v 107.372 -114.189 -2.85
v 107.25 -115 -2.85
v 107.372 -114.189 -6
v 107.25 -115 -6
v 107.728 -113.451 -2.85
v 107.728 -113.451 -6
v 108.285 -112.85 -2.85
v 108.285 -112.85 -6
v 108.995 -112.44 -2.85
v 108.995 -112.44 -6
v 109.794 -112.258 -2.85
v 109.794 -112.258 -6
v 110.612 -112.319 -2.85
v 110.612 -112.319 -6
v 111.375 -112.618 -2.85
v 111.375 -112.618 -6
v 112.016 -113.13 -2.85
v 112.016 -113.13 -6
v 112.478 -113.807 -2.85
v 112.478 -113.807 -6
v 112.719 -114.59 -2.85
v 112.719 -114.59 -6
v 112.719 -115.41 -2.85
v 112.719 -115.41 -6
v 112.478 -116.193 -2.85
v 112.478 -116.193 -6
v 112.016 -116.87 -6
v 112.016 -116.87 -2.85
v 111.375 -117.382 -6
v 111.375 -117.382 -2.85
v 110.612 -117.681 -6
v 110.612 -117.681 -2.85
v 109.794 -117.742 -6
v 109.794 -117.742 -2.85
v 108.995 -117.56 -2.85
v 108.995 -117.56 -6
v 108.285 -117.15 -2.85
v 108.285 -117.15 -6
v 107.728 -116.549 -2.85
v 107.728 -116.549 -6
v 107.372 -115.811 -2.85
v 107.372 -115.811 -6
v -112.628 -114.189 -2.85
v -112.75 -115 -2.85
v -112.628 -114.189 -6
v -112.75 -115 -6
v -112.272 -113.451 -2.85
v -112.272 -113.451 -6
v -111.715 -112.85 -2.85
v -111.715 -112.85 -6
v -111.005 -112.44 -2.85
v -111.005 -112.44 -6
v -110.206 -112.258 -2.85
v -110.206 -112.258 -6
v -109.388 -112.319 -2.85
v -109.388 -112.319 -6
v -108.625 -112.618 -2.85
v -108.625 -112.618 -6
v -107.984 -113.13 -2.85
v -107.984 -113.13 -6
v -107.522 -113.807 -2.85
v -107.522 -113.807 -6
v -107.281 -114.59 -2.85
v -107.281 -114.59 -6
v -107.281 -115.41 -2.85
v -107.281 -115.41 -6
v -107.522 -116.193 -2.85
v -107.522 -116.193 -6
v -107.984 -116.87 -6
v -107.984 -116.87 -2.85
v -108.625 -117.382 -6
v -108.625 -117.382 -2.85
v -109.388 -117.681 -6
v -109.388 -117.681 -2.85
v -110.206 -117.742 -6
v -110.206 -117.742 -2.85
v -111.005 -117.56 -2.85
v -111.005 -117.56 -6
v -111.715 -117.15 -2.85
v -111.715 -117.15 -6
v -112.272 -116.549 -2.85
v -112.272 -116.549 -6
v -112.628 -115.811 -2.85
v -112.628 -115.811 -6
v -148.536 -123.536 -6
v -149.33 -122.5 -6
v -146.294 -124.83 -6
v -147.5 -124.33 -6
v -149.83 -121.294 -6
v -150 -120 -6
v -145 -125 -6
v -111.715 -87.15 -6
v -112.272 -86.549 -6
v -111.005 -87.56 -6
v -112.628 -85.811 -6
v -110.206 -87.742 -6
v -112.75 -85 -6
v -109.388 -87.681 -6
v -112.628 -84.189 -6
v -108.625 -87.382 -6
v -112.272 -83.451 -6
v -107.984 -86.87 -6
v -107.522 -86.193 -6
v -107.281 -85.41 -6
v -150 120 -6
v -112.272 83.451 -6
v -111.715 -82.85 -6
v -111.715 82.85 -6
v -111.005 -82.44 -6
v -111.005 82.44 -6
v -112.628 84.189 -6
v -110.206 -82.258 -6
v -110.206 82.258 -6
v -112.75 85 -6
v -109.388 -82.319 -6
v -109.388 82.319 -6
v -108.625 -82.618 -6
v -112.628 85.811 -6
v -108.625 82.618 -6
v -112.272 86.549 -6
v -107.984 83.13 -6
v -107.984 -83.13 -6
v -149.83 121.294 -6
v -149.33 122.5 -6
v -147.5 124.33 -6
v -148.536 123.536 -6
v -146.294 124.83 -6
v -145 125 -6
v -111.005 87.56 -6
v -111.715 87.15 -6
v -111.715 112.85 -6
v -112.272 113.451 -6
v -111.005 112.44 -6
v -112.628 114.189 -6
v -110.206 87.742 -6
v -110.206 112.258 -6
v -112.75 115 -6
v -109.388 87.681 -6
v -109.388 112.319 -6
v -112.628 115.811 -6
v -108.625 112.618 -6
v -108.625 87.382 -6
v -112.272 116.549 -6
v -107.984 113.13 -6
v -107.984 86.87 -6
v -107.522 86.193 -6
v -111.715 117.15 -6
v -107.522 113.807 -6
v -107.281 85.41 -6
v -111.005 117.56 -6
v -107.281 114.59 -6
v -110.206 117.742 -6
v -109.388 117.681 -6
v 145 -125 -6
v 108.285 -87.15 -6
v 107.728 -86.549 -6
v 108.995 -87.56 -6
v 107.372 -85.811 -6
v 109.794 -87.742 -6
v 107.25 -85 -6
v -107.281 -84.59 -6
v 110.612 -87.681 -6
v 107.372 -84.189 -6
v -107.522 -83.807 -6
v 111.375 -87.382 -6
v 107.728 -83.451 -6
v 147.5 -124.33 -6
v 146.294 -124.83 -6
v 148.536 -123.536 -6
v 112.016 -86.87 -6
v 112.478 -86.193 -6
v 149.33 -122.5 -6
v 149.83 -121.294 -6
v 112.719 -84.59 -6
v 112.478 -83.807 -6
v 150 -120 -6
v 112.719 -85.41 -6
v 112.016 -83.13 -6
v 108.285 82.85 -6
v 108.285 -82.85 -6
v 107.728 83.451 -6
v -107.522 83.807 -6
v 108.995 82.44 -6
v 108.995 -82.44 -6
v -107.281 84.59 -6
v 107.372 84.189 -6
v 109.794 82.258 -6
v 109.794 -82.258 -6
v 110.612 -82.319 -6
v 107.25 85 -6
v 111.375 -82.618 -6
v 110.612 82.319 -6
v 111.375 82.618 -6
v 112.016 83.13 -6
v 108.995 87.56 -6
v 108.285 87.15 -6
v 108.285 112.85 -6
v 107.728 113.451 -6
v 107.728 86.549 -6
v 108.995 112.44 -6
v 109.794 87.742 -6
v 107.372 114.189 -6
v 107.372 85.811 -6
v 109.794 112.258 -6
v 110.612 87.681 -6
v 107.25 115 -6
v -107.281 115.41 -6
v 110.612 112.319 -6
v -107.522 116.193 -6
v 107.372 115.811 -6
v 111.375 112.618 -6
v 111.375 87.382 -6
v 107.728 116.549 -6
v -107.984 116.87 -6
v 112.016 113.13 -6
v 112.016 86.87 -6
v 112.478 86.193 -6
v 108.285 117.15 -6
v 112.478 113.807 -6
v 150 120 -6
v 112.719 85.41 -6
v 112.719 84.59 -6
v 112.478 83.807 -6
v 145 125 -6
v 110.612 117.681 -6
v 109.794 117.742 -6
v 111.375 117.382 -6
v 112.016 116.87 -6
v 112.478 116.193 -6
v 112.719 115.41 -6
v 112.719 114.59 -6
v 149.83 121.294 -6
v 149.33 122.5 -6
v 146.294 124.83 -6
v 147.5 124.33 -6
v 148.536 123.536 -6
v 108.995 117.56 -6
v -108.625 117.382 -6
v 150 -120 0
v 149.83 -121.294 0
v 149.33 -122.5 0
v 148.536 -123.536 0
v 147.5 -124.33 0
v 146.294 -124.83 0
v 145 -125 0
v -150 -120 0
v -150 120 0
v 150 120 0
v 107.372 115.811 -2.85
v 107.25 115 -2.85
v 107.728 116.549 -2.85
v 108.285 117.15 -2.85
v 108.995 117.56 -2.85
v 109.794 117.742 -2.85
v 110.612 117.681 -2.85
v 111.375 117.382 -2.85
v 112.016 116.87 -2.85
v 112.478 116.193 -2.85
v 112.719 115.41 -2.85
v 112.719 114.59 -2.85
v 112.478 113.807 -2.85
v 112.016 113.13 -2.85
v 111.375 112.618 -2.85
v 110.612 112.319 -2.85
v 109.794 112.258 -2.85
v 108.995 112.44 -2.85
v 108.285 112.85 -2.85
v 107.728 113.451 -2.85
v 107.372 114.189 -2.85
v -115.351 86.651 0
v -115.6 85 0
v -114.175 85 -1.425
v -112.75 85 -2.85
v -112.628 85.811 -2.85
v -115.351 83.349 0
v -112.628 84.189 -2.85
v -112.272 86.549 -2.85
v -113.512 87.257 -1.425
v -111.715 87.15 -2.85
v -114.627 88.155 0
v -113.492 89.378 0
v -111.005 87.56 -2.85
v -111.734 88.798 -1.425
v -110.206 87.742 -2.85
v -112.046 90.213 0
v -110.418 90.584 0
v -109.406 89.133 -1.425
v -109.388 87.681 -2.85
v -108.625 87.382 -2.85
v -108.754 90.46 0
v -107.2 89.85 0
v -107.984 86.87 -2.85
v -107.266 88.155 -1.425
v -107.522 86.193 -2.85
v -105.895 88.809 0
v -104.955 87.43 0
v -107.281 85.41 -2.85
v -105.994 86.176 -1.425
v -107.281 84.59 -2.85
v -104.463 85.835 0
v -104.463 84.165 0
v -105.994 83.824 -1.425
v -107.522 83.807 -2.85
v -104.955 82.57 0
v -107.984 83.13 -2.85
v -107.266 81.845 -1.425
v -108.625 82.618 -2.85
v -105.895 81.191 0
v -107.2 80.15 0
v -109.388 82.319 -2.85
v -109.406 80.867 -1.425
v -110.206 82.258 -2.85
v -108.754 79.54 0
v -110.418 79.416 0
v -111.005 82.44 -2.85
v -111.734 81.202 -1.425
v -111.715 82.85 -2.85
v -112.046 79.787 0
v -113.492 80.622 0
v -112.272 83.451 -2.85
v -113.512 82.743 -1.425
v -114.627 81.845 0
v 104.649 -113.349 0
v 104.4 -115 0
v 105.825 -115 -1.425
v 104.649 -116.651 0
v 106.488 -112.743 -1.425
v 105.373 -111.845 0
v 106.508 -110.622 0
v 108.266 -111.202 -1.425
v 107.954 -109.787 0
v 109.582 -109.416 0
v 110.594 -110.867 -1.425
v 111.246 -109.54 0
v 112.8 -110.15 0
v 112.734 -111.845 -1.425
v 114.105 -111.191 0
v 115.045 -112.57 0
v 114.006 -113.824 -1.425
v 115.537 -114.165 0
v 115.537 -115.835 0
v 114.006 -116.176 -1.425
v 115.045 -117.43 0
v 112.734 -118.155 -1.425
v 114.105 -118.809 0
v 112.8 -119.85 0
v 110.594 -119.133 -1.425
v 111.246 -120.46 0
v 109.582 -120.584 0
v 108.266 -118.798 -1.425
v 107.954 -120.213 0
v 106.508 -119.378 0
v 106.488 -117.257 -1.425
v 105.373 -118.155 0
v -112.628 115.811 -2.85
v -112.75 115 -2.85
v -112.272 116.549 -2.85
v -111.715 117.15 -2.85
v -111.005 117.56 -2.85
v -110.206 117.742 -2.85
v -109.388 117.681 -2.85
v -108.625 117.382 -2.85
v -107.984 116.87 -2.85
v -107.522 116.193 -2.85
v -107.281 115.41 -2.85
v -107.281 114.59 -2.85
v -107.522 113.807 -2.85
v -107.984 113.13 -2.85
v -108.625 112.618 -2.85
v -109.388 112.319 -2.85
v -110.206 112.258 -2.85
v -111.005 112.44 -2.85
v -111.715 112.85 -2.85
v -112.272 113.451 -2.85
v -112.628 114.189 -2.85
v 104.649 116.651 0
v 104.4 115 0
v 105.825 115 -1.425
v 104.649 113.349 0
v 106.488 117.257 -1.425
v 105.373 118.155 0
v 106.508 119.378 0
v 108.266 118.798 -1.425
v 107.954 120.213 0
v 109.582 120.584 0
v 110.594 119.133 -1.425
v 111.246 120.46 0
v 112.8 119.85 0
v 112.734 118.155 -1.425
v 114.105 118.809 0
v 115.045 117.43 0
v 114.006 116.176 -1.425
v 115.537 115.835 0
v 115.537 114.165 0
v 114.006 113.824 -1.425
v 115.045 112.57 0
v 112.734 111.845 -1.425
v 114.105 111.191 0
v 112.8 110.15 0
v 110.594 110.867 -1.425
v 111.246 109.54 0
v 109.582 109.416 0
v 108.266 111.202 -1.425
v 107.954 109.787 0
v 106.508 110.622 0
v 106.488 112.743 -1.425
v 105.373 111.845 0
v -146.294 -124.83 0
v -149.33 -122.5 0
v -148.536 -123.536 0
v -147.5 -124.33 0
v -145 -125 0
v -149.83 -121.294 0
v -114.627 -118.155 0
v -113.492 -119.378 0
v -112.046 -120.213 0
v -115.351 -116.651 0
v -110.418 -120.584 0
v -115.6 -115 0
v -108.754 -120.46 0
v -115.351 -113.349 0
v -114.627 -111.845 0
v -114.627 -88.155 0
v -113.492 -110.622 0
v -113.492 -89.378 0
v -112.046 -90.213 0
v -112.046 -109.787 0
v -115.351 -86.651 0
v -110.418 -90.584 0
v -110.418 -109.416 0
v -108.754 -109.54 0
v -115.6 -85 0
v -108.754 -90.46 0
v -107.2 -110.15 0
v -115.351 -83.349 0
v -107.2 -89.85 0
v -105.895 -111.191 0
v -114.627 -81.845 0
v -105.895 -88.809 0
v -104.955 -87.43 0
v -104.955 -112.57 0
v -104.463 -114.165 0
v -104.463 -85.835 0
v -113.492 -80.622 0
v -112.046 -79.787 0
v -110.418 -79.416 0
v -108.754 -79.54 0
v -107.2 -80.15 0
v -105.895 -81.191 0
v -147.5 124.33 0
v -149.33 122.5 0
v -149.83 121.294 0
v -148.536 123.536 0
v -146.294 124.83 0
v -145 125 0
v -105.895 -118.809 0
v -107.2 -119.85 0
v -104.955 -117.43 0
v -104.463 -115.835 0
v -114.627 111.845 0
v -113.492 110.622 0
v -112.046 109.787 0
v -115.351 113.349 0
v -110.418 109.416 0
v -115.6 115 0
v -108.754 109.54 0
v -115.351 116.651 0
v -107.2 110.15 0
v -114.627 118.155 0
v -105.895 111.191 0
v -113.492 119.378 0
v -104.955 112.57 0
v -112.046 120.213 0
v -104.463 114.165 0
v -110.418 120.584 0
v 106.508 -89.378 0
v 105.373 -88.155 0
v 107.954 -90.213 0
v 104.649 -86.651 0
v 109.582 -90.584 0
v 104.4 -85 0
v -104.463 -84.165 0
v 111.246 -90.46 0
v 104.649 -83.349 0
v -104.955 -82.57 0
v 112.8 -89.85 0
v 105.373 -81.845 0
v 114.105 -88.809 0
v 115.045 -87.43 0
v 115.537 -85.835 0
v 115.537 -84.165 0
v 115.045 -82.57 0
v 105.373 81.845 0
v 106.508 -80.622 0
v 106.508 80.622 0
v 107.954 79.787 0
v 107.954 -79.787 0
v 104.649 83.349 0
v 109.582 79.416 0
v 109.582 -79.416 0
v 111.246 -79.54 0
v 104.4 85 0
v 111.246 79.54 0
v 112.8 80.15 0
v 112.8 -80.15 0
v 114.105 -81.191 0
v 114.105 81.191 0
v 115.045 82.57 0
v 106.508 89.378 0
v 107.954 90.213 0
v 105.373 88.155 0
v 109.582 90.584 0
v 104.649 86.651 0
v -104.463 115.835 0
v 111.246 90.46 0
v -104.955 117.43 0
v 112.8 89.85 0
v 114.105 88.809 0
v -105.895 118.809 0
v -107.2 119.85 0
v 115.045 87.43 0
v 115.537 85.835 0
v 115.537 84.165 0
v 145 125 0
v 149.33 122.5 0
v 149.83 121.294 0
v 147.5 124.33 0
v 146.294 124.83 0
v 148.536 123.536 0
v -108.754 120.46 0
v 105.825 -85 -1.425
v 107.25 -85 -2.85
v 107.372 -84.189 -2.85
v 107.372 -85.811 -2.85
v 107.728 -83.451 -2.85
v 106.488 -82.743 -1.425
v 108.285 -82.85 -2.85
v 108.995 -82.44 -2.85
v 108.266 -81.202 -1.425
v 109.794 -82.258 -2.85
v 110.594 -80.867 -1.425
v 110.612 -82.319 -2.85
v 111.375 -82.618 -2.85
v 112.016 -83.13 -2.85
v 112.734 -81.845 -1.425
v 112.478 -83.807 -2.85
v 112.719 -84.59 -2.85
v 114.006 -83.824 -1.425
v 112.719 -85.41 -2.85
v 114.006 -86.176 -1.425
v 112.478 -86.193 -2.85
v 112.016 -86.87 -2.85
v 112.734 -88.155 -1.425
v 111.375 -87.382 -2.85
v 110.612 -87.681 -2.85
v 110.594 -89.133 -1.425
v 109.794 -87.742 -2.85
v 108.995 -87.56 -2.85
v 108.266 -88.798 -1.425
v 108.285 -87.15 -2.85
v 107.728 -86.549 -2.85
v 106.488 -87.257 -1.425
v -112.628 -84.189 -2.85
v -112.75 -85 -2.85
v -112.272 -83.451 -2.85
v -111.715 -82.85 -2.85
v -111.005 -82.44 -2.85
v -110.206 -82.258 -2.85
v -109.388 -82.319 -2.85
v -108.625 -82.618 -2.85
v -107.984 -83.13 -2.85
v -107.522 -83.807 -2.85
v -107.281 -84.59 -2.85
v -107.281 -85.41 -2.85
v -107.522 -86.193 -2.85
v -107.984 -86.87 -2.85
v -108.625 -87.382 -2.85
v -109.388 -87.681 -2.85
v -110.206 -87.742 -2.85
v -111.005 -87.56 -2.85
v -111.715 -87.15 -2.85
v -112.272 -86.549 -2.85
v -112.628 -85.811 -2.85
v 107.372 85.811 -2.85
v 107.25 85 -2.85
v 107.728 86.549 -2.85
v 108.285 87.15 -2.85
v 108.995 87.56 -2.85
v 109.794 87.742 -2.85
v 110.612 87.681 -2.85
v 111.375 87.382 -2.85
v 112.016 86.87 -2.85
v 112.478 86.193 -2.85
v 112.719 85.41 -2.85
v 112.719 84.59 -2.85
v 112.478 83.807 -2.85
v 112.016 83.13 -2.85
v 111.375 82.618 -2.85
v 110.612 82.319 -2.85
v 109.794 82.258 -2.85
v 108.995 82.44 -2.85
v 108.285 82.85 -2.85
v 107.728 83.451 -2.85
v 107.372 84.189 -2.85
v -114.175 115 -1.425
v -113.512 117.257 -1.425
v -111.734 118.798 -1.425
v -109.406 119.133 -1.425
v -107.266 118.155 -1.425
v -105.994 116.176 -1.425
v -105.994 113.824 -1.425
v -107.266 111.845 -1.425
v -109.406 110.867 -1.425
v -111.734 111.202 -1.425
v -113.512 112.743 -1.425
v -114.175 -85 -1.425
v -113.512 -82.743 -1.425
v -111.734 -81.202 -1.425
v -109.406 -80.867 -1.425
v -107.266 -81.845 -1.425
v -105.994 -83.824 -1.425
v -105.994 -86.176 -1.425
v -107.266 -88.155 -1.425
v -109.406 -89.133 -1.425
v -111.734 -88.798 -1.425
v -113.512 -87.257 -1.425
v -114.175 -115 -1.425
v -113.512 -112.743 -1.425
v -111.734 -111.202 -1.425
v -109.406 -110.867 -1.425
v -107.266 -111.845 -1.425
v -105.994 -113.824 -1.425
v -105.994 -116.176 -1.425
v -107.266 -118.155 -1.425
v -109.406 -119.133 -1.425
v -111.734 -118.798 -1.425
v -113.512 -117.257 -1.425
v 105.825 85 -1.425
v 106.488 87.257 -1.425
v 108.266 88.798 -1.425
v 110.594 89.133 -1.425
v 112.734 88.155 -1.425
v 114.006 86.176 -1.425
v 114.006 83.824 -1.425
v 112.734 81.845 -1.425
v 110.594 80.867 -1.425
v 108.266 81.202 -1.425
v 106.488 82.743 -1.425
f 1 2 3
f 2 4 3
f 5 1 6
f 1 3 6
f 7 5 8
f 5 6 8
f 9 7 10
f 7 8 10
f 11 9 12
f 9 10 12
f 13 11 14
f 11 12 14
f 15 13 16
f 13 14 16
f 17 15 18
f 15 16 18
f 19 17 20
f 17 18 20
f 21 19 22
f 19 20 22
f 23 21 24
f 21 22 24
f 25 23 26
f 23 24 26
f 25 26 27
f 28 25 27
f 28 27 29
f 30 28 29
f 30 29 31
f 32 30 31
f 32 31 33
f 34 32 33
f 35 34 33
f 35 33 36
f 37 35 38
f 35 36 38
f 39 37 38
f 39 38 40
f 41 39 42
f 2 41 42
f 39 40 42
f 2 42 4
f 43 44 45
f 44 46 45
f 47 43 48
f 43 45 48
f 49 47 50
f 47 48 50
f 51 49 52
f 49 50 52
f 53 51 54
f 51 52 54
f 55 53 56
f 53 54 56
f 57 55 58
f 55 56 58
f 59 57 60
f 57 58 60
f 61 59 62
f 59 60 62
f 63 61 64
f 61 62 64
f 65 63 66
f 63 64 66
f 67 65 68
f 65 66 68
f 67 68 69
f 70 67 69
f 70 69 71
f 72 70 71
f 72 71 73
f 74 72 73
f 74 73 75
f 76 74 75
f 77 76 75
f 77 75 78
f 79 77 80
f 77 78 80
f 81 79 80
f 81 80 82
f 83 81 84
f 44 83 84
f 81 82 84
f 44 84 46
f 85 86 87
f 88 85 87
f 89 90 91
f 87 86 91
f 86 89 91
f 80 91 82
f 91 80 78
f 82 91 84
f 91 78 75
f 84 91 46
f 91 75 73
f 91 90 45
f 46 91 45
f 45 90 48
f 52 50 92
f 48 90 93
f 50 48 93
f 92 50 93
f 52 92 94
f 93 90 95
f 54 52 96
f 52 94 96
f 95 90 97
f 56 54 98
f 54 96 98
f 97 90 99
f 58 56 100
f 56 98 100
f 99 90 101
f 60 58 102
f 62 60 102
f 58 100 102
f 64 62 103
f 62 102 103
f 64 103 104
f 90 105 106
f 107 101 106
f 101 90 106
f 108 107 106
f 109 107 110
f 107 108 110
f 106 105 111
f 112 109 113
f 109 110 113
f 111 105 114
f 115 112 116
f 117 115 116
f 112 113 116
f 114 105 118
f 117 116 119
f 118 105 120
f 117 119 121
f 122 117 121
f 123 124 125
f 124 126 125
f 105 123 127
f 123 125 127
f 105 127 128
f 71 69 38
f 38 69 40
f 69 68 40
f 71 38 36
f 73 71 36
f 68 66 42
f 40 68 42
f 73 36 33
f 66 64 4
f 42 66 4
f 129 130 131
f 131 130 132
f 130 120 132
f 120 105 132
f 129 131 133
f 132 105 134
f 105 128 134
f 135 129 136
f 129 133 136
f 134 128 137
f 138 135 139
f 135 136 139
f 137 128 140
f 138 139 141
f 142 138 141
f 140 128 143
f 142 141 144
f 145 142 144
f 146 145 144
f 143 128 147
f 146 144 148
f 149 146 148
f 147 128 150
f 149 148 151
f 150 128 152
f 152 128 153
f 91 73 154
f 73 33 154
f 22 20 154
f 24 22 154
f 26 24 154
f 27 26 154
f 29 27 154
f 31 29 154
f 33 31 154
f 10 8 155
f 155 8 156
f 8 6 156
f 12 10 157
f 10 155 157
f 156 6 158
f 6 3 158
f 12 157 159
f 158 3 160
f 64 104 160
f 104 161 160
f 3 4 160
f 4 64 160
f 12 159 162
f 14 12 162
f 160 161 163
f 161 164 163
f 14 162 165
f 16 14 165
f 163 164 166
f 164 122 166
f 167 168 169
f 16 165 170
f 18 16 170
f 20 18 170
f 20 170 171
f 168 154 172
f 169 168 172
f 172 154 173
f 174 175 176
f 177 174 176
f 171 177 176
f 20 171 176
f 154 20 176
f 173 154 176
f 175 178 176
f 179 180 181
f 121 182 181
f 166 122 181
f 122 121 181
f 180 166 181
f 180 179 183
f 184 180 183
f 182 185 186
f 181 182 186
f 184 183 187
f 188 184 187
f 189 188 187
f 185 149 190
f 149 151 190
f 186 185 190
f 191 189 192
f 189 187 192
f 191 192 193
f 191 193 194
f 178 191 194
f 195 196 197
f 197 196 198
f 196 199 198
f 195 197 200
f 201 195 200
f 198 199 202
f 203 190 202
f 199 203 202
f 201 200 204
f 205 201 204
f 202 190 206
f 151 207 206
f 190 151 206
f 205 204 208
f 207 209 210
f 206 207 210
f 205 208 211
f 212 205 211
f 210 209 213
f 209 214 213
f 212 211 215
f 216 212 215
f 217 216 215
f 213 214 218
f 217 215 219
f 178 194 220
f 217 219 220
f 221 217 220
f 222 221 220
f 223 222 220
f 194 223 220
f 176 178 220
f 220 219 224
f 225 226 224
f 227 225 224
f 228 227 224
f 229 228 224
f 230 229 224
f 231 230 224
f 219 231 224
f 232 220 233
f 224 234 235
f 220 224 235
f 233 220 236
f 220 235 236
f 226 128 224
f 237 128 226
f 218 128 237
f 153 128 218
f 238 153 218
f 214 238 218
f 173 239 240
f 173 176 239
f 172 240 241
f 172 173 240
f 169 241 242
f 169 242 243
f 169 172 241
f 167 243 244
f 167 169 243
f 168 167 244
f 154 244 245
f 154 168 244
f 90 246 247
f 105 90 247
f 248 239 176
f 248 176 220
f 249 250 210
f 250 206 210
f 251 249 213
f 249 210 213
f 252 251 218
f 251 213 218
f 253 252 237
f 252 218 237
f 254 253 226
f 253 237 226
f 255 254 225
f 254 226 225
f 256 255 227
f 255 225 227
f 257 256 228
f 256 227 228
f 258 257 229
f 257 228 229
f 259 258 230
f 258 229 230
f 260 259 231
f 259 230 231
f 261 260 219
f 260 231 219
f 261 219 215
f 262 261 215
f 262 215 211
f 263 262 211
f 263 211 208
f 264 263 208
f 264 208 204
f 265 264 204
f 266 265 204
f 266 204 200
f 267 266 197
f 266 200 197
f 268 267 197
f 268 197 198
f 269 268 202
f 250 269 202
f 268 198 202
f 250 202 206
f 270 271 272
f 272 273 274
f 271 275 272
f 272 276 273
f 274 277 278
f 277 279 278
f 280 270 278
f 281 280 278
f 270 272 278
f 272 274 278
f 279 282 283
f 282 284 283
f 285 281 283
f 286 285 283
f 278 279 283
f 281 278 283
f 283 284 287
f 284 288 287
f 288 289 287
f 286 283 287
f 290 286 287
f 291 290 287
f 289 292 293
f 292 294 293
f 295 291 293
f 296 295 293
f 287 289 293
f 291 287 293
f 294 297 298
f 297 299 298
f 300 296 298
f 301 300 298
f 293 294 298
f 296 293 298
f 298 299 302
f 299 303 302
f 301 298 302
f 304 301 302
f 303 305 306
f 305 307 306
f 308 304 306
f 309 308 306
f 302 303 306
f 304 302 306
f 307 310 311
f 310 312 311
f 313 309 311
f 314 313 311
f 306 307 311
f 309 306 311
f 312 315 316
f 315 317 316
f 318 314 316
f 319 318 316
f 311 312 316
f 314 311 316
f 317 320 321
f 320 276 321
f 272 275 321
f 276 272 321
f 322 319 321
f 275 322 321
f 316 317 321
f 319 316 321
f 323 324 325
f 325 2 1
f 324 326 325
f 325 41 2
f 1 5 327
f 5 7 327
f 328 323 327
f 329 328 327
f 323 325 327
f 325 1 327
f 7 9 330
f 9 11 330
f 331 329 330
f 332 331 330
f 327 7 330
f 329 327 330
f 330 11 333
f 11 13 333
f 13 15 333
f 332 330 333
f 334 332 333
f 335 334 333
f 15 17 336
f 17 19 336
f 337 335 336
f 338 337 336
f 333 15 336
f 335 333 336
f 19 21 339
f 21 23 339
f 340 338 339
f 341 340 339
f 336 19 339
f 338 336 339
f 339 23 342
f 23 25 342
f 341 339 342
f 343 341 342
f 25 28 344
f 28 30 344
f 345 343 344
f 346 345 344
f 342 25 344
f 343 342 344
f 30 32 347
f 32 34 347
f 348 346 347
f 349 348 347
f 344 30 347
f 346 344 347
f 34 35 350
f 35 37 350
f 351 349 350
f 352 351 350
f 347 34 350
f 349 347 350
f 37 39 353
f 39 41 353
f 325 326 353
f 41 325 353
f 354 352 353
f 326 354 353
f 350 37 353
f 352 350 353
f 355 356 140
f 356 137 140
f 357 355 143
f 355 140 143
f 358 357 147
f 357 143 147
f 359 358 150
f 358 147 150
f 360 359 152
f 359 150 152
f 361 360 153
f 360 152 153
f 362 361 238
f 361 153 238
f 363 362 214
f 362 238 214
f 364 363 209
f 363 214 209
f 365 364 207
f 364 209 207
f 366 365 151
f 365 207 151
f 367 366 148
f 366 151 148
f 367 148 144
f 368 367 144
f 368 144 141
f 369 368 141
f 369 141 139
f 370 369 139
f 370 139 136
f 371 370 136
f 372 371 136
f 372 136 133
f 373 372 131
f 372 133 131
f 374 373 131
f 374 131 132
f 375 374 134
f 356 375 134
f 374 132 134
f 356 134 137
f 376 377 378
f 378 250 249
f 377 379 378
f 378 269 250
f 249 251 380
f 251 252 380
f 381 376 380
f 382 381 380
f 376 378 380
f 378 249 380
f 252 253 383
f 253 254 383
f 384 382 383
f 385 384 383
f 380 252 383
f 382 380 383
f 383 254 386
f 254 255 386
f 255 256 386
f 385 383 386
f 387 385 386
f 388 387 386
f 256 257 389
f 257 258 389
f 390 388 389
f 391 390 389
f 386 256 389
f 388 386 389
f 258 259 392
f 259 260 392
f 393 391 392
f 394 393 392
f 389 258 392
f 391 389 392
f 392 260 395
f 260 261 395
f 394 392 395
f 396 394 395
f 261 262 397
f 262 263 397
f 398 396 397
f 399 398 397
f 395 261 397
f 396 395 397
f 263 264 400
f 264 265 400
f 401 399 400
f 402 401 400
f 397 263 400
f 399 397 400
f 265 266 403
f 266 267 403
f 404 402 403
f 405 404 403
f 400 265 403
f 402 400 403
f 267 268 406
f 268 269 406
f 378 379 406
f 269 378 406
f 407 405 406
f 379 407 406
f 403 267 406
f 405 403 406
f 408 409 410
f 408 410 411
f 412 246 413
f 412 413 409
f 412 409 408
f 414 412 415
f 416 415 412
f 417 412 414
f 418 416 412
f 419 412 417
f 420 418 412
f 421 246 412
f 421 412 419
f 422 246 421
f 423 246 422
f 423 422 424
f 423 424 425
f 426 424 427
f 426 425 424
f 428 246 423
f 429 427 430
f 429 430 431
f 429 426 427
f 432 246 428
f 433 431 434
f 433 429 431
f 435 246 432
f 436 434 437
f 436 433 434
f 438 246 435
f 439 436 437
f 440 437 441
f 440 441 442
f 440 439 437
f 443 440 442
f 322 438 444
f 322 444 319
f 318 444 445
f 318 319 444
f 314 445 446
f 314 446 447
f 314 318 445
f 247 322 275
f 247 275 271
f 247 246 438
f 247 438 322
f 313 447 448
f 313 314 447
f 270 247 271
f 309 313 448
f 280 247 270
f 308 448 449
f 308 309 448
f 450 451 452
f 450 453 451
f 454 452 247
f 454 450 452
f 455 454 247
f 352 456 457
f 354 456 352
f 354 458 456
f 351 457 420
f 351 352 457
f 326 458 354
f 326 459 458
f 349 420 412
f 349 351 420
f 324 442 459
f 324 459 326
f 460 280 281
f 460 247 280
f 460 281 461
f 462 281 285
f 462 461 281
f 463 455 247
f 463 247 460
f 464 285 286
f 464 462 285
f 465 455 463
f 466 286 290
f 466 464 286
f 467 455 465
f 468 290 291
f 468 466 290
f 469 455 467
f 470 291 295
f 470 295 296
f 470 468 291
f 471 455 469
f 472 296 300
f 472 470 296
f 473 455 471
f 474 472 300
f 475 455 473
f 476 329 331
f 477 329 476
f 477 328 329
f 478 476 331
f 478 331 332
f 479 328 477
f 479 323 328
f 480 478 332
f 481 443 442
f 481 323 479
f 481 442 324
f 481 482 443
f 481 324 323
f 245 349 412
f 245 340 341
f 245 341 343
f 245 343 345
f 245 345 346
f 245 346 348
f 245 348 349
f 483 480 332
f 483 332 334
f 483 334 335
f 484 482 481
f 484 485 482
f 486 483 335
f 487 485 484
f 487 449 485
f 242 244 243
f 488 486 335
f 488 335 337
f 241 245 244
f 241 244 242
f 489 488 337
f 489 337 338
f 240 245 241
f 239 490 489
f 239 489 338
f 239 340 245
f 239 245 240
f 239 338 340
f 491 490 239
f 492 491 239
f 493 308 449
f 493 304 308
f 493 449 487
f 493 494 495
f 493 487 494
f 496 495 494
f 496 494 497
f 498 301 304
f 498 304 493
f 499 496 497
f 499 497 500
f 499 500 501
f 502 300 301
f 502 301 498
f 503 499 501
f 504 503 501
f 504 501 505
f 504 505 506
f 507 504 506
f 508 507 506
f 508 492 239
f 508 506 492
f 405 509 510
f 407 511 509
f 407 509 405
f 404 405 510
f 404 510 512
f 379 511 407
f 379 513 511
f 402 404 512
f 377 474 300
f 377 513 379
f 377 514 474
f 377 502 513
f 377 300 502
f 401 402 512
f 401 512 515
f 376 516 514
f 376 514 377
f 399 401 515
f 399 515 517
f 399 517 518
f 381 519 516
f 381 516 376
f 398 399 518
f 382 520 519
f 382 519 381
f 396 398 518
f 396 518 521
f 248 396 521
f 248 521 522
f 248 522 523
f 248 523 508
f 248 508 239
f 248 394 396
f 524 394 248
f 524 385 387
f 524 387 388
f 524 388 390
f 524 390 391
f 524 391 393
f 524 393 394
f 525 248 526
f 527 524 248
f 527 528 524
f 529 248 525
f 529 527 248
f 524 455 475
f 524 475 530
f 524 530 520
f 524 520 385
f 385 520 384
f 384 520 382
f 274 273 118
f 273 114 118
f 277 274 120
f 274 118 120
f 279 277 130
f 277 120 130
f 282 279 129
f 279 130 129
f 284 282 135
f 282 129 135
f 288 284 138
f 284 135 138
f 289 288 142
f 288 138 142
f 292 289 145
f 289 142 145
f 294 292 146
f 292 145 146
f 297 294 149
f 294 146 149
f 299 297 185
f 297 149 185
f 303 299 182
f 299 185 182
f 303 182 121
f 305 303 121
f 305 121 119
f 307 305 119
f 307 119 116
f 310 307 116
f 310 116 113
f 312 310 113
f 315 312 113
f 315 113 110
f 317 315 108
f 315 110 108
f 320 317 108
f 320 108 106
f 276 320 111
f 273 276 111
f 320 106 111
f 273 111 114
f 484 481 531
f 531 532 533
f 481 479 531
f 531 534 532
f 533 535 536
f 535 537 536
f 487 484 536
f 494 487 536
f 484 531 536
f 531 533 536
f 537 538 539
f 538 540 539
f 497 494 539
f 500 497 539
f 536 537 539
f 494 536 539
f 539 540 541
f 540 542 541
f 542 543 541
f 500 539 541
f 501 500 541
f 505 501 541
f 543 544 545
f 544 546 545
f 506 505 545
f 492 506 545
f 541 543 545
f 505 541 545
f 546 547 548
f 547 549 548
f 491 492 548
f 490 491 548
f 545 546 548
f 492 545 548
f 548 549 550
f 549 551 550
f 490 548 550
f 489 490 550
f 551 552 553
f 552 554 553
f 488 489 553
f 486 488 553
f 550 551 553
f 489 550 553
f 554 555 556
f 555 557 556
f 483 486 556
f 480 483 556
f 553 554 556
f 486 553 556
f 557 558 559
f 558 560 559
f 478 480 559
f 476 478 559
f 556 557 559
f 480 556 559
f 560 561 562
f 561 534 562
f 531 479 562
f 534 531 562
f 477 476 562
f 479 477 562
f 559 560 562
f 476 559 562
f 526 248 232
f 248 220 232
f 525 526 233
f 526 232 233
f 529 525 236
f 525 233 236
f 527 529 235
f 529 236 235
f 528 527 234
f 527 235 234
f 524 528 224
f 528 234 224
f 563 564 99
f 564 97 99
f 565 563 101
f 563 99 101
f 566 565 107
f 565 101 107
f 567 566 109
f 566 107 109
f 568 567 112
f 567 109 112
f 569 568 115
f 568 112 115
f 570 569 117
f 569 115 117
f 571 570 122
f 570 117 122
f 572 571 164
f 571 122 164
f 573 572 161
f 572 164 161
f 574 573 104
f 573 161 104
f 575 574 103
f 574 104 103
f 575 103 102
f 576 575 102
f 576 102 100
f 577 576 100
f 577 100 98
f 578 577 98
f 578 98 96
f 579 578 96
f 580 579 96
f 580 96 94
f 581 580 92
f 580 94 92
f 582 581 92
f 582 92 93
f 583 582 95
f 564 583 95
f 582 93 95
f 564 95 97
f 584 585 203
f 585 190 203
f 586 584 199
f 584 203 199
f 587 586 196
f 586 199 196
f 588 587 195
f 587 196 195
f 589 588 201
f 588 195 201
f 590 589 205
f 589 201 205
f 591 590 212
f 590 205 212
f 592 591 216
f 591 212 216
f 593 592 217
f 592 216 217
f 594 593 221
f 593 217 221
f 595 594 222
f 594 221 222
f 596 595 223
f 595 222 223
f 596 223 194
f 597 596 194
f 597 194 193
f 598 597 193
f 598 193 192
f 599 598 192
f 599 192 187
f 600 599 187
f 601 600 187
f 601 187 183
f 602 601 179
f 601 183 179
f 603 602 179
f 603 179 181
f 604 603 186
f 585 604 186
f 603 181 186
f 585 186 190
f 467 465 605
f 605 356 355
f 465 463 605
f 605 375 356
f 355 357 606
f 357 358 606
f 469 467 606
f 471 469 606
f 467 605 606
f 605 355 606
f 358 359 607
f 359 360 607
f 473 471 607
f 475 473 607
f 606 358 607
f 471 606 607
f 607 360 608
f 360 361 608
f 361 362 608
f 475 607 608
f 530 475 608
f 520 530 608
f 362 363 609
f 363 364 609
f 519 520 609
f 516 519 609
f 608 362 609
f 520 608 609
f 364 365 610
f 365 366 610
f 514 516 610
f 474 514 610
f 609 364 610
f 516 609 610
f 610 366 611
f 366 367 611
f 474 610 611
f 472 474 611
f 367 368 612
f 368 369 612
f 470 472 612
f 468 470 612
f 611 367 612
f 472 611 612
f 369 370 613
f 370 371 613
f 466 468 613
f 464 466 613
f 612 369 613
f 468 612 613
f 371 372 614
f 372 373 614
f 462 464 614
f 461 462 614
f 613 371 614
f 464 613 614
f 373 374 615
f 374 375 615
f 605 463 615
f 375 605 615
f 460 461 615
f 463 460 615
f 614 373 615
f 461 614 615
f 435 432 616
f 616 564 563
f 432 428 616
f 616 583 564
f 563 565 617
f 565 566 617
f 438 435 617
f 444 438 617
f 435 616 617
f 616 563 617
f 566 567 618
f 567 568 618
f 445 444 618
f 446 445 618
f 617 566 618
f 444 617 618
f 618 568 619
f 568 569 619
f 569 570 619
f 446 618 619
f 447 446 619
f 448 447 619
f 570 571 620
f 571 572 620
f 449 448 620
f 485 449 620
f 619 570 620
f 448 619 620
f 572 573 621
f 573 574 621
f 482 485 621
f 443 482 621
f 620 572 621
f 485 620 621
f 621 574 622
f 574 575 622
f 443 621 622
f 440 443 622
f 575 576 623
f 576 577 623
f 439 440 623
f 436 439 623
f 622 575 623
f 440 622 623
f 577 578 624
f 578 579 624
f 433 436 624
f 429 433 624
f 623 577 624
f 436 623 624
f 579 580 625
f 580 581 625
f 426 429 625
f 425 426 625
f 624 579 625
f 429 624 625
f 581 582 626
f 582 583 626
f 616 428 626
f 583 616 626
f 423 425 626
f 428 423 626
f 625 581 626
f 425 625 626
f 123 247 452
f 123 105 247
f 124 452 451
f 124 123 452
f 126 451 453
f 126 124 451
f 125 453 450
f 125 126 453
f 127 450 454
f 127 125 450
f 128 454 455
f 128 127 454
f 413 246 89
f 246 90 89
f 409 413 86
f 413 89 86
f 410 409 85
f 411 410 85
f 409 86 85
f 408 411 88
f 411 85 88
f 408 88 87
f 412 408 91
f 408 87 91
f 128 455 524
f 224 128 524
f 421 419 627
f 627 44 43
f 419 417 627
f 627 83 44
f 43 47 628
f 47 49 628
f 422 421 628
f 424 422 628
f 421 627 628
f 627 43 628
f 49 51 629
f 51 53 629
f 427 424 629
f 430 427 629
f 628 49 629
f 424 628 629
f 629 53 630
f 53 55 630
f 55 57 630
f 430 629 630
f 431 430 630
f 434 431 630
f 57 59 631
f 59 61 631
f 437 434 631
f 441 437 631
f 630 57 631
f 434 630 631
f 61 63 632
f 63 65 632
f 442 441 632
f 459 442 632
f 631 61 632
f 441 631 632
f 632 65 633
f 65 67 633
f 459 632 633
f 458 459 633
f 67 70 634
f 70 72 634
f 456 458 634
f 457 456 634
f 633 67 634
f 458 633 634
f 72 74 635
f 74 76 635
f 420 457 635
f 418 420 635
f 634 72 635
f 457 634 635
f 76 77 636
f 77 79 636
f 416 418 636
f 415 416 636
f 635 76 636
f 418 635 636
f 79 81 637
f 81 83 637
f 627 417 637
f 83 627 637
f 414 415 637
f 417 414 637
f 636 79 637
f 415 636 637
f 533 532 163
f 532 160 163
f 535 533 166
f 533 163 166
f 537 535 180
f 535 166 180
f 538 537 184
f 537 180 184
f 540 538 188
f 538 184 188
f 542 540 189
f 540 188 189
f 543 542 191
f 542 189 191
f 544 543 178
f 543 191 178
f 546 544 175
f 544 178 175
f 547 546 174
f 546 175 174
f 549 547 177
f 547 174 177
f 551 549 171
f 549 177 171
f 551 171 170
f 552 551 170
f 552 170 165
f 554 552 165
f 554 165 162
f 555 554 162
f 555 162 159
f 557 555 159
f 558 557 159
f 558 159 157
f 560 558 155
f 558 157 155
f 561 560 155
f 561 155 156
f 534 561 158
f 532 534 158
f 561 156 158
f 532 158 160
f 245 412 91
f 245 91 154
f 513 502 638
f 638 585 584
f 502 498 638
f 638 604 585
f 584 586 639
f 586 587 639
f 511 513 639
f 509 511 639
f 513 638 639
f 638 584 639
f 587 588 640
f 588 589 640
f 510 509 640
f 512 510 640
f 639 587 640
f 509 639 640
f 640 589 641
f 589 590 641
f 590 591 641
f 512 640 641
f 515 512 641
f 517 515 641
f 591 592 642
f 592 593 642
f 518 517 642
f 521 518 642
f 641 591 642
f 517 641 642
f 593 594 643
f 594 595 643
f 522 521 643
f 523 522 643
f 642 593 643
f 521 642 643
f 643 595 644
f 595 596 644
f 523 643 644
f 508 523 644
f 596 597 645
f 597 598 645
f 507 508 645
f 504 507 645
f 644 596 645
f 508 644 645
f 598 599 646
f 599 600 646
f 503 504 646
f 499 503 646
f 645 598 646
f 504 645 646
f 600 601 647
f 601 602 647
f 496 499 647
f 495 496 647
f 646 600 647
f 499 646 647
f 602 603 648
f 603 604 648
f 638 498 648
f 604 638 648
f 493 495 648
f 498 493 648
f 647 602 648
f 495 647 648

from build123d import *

# Parameters (mm, degrees)
F0_W           = 300
F0_H           = 250
F1_DEPTH       = 6
F2_D           = 5.5
F2_CSINK_D     = 11.2
F2_CSINK_ANGLE = 90
F3_R           = 5


with BuildPart() as f1:
    # F0 (on Top) → F1 (new body)
    with BuildSketch(Plane.XY):
        Rectangle(F0_W, F0_H)
    extrude(amount=-F1_DEPTH)

    # F2 (through all)
    with Locations(Plane.XY):
        with Locations((-110, 115), (-110, 85), (110, 115), (110, 85), (110, -85), (110, -115), (-110, -115), (-110, -85)):
            CounterSinkHole(F2_D / 2, F2_CSINK_D / 2, counter_sink_angle=F2_CSINK_ANGLE)

    # F3
    f3_edges = [f1.edges().sort_by_distance(p)[0] for p in [
        (-150, 125, -3),
        (150, 125, -3),
        (150, -125, -3),
        (-150, -125, -3),
    ]]
    fillet(f3_edges, radius=F3_R)


solid = f1.part
